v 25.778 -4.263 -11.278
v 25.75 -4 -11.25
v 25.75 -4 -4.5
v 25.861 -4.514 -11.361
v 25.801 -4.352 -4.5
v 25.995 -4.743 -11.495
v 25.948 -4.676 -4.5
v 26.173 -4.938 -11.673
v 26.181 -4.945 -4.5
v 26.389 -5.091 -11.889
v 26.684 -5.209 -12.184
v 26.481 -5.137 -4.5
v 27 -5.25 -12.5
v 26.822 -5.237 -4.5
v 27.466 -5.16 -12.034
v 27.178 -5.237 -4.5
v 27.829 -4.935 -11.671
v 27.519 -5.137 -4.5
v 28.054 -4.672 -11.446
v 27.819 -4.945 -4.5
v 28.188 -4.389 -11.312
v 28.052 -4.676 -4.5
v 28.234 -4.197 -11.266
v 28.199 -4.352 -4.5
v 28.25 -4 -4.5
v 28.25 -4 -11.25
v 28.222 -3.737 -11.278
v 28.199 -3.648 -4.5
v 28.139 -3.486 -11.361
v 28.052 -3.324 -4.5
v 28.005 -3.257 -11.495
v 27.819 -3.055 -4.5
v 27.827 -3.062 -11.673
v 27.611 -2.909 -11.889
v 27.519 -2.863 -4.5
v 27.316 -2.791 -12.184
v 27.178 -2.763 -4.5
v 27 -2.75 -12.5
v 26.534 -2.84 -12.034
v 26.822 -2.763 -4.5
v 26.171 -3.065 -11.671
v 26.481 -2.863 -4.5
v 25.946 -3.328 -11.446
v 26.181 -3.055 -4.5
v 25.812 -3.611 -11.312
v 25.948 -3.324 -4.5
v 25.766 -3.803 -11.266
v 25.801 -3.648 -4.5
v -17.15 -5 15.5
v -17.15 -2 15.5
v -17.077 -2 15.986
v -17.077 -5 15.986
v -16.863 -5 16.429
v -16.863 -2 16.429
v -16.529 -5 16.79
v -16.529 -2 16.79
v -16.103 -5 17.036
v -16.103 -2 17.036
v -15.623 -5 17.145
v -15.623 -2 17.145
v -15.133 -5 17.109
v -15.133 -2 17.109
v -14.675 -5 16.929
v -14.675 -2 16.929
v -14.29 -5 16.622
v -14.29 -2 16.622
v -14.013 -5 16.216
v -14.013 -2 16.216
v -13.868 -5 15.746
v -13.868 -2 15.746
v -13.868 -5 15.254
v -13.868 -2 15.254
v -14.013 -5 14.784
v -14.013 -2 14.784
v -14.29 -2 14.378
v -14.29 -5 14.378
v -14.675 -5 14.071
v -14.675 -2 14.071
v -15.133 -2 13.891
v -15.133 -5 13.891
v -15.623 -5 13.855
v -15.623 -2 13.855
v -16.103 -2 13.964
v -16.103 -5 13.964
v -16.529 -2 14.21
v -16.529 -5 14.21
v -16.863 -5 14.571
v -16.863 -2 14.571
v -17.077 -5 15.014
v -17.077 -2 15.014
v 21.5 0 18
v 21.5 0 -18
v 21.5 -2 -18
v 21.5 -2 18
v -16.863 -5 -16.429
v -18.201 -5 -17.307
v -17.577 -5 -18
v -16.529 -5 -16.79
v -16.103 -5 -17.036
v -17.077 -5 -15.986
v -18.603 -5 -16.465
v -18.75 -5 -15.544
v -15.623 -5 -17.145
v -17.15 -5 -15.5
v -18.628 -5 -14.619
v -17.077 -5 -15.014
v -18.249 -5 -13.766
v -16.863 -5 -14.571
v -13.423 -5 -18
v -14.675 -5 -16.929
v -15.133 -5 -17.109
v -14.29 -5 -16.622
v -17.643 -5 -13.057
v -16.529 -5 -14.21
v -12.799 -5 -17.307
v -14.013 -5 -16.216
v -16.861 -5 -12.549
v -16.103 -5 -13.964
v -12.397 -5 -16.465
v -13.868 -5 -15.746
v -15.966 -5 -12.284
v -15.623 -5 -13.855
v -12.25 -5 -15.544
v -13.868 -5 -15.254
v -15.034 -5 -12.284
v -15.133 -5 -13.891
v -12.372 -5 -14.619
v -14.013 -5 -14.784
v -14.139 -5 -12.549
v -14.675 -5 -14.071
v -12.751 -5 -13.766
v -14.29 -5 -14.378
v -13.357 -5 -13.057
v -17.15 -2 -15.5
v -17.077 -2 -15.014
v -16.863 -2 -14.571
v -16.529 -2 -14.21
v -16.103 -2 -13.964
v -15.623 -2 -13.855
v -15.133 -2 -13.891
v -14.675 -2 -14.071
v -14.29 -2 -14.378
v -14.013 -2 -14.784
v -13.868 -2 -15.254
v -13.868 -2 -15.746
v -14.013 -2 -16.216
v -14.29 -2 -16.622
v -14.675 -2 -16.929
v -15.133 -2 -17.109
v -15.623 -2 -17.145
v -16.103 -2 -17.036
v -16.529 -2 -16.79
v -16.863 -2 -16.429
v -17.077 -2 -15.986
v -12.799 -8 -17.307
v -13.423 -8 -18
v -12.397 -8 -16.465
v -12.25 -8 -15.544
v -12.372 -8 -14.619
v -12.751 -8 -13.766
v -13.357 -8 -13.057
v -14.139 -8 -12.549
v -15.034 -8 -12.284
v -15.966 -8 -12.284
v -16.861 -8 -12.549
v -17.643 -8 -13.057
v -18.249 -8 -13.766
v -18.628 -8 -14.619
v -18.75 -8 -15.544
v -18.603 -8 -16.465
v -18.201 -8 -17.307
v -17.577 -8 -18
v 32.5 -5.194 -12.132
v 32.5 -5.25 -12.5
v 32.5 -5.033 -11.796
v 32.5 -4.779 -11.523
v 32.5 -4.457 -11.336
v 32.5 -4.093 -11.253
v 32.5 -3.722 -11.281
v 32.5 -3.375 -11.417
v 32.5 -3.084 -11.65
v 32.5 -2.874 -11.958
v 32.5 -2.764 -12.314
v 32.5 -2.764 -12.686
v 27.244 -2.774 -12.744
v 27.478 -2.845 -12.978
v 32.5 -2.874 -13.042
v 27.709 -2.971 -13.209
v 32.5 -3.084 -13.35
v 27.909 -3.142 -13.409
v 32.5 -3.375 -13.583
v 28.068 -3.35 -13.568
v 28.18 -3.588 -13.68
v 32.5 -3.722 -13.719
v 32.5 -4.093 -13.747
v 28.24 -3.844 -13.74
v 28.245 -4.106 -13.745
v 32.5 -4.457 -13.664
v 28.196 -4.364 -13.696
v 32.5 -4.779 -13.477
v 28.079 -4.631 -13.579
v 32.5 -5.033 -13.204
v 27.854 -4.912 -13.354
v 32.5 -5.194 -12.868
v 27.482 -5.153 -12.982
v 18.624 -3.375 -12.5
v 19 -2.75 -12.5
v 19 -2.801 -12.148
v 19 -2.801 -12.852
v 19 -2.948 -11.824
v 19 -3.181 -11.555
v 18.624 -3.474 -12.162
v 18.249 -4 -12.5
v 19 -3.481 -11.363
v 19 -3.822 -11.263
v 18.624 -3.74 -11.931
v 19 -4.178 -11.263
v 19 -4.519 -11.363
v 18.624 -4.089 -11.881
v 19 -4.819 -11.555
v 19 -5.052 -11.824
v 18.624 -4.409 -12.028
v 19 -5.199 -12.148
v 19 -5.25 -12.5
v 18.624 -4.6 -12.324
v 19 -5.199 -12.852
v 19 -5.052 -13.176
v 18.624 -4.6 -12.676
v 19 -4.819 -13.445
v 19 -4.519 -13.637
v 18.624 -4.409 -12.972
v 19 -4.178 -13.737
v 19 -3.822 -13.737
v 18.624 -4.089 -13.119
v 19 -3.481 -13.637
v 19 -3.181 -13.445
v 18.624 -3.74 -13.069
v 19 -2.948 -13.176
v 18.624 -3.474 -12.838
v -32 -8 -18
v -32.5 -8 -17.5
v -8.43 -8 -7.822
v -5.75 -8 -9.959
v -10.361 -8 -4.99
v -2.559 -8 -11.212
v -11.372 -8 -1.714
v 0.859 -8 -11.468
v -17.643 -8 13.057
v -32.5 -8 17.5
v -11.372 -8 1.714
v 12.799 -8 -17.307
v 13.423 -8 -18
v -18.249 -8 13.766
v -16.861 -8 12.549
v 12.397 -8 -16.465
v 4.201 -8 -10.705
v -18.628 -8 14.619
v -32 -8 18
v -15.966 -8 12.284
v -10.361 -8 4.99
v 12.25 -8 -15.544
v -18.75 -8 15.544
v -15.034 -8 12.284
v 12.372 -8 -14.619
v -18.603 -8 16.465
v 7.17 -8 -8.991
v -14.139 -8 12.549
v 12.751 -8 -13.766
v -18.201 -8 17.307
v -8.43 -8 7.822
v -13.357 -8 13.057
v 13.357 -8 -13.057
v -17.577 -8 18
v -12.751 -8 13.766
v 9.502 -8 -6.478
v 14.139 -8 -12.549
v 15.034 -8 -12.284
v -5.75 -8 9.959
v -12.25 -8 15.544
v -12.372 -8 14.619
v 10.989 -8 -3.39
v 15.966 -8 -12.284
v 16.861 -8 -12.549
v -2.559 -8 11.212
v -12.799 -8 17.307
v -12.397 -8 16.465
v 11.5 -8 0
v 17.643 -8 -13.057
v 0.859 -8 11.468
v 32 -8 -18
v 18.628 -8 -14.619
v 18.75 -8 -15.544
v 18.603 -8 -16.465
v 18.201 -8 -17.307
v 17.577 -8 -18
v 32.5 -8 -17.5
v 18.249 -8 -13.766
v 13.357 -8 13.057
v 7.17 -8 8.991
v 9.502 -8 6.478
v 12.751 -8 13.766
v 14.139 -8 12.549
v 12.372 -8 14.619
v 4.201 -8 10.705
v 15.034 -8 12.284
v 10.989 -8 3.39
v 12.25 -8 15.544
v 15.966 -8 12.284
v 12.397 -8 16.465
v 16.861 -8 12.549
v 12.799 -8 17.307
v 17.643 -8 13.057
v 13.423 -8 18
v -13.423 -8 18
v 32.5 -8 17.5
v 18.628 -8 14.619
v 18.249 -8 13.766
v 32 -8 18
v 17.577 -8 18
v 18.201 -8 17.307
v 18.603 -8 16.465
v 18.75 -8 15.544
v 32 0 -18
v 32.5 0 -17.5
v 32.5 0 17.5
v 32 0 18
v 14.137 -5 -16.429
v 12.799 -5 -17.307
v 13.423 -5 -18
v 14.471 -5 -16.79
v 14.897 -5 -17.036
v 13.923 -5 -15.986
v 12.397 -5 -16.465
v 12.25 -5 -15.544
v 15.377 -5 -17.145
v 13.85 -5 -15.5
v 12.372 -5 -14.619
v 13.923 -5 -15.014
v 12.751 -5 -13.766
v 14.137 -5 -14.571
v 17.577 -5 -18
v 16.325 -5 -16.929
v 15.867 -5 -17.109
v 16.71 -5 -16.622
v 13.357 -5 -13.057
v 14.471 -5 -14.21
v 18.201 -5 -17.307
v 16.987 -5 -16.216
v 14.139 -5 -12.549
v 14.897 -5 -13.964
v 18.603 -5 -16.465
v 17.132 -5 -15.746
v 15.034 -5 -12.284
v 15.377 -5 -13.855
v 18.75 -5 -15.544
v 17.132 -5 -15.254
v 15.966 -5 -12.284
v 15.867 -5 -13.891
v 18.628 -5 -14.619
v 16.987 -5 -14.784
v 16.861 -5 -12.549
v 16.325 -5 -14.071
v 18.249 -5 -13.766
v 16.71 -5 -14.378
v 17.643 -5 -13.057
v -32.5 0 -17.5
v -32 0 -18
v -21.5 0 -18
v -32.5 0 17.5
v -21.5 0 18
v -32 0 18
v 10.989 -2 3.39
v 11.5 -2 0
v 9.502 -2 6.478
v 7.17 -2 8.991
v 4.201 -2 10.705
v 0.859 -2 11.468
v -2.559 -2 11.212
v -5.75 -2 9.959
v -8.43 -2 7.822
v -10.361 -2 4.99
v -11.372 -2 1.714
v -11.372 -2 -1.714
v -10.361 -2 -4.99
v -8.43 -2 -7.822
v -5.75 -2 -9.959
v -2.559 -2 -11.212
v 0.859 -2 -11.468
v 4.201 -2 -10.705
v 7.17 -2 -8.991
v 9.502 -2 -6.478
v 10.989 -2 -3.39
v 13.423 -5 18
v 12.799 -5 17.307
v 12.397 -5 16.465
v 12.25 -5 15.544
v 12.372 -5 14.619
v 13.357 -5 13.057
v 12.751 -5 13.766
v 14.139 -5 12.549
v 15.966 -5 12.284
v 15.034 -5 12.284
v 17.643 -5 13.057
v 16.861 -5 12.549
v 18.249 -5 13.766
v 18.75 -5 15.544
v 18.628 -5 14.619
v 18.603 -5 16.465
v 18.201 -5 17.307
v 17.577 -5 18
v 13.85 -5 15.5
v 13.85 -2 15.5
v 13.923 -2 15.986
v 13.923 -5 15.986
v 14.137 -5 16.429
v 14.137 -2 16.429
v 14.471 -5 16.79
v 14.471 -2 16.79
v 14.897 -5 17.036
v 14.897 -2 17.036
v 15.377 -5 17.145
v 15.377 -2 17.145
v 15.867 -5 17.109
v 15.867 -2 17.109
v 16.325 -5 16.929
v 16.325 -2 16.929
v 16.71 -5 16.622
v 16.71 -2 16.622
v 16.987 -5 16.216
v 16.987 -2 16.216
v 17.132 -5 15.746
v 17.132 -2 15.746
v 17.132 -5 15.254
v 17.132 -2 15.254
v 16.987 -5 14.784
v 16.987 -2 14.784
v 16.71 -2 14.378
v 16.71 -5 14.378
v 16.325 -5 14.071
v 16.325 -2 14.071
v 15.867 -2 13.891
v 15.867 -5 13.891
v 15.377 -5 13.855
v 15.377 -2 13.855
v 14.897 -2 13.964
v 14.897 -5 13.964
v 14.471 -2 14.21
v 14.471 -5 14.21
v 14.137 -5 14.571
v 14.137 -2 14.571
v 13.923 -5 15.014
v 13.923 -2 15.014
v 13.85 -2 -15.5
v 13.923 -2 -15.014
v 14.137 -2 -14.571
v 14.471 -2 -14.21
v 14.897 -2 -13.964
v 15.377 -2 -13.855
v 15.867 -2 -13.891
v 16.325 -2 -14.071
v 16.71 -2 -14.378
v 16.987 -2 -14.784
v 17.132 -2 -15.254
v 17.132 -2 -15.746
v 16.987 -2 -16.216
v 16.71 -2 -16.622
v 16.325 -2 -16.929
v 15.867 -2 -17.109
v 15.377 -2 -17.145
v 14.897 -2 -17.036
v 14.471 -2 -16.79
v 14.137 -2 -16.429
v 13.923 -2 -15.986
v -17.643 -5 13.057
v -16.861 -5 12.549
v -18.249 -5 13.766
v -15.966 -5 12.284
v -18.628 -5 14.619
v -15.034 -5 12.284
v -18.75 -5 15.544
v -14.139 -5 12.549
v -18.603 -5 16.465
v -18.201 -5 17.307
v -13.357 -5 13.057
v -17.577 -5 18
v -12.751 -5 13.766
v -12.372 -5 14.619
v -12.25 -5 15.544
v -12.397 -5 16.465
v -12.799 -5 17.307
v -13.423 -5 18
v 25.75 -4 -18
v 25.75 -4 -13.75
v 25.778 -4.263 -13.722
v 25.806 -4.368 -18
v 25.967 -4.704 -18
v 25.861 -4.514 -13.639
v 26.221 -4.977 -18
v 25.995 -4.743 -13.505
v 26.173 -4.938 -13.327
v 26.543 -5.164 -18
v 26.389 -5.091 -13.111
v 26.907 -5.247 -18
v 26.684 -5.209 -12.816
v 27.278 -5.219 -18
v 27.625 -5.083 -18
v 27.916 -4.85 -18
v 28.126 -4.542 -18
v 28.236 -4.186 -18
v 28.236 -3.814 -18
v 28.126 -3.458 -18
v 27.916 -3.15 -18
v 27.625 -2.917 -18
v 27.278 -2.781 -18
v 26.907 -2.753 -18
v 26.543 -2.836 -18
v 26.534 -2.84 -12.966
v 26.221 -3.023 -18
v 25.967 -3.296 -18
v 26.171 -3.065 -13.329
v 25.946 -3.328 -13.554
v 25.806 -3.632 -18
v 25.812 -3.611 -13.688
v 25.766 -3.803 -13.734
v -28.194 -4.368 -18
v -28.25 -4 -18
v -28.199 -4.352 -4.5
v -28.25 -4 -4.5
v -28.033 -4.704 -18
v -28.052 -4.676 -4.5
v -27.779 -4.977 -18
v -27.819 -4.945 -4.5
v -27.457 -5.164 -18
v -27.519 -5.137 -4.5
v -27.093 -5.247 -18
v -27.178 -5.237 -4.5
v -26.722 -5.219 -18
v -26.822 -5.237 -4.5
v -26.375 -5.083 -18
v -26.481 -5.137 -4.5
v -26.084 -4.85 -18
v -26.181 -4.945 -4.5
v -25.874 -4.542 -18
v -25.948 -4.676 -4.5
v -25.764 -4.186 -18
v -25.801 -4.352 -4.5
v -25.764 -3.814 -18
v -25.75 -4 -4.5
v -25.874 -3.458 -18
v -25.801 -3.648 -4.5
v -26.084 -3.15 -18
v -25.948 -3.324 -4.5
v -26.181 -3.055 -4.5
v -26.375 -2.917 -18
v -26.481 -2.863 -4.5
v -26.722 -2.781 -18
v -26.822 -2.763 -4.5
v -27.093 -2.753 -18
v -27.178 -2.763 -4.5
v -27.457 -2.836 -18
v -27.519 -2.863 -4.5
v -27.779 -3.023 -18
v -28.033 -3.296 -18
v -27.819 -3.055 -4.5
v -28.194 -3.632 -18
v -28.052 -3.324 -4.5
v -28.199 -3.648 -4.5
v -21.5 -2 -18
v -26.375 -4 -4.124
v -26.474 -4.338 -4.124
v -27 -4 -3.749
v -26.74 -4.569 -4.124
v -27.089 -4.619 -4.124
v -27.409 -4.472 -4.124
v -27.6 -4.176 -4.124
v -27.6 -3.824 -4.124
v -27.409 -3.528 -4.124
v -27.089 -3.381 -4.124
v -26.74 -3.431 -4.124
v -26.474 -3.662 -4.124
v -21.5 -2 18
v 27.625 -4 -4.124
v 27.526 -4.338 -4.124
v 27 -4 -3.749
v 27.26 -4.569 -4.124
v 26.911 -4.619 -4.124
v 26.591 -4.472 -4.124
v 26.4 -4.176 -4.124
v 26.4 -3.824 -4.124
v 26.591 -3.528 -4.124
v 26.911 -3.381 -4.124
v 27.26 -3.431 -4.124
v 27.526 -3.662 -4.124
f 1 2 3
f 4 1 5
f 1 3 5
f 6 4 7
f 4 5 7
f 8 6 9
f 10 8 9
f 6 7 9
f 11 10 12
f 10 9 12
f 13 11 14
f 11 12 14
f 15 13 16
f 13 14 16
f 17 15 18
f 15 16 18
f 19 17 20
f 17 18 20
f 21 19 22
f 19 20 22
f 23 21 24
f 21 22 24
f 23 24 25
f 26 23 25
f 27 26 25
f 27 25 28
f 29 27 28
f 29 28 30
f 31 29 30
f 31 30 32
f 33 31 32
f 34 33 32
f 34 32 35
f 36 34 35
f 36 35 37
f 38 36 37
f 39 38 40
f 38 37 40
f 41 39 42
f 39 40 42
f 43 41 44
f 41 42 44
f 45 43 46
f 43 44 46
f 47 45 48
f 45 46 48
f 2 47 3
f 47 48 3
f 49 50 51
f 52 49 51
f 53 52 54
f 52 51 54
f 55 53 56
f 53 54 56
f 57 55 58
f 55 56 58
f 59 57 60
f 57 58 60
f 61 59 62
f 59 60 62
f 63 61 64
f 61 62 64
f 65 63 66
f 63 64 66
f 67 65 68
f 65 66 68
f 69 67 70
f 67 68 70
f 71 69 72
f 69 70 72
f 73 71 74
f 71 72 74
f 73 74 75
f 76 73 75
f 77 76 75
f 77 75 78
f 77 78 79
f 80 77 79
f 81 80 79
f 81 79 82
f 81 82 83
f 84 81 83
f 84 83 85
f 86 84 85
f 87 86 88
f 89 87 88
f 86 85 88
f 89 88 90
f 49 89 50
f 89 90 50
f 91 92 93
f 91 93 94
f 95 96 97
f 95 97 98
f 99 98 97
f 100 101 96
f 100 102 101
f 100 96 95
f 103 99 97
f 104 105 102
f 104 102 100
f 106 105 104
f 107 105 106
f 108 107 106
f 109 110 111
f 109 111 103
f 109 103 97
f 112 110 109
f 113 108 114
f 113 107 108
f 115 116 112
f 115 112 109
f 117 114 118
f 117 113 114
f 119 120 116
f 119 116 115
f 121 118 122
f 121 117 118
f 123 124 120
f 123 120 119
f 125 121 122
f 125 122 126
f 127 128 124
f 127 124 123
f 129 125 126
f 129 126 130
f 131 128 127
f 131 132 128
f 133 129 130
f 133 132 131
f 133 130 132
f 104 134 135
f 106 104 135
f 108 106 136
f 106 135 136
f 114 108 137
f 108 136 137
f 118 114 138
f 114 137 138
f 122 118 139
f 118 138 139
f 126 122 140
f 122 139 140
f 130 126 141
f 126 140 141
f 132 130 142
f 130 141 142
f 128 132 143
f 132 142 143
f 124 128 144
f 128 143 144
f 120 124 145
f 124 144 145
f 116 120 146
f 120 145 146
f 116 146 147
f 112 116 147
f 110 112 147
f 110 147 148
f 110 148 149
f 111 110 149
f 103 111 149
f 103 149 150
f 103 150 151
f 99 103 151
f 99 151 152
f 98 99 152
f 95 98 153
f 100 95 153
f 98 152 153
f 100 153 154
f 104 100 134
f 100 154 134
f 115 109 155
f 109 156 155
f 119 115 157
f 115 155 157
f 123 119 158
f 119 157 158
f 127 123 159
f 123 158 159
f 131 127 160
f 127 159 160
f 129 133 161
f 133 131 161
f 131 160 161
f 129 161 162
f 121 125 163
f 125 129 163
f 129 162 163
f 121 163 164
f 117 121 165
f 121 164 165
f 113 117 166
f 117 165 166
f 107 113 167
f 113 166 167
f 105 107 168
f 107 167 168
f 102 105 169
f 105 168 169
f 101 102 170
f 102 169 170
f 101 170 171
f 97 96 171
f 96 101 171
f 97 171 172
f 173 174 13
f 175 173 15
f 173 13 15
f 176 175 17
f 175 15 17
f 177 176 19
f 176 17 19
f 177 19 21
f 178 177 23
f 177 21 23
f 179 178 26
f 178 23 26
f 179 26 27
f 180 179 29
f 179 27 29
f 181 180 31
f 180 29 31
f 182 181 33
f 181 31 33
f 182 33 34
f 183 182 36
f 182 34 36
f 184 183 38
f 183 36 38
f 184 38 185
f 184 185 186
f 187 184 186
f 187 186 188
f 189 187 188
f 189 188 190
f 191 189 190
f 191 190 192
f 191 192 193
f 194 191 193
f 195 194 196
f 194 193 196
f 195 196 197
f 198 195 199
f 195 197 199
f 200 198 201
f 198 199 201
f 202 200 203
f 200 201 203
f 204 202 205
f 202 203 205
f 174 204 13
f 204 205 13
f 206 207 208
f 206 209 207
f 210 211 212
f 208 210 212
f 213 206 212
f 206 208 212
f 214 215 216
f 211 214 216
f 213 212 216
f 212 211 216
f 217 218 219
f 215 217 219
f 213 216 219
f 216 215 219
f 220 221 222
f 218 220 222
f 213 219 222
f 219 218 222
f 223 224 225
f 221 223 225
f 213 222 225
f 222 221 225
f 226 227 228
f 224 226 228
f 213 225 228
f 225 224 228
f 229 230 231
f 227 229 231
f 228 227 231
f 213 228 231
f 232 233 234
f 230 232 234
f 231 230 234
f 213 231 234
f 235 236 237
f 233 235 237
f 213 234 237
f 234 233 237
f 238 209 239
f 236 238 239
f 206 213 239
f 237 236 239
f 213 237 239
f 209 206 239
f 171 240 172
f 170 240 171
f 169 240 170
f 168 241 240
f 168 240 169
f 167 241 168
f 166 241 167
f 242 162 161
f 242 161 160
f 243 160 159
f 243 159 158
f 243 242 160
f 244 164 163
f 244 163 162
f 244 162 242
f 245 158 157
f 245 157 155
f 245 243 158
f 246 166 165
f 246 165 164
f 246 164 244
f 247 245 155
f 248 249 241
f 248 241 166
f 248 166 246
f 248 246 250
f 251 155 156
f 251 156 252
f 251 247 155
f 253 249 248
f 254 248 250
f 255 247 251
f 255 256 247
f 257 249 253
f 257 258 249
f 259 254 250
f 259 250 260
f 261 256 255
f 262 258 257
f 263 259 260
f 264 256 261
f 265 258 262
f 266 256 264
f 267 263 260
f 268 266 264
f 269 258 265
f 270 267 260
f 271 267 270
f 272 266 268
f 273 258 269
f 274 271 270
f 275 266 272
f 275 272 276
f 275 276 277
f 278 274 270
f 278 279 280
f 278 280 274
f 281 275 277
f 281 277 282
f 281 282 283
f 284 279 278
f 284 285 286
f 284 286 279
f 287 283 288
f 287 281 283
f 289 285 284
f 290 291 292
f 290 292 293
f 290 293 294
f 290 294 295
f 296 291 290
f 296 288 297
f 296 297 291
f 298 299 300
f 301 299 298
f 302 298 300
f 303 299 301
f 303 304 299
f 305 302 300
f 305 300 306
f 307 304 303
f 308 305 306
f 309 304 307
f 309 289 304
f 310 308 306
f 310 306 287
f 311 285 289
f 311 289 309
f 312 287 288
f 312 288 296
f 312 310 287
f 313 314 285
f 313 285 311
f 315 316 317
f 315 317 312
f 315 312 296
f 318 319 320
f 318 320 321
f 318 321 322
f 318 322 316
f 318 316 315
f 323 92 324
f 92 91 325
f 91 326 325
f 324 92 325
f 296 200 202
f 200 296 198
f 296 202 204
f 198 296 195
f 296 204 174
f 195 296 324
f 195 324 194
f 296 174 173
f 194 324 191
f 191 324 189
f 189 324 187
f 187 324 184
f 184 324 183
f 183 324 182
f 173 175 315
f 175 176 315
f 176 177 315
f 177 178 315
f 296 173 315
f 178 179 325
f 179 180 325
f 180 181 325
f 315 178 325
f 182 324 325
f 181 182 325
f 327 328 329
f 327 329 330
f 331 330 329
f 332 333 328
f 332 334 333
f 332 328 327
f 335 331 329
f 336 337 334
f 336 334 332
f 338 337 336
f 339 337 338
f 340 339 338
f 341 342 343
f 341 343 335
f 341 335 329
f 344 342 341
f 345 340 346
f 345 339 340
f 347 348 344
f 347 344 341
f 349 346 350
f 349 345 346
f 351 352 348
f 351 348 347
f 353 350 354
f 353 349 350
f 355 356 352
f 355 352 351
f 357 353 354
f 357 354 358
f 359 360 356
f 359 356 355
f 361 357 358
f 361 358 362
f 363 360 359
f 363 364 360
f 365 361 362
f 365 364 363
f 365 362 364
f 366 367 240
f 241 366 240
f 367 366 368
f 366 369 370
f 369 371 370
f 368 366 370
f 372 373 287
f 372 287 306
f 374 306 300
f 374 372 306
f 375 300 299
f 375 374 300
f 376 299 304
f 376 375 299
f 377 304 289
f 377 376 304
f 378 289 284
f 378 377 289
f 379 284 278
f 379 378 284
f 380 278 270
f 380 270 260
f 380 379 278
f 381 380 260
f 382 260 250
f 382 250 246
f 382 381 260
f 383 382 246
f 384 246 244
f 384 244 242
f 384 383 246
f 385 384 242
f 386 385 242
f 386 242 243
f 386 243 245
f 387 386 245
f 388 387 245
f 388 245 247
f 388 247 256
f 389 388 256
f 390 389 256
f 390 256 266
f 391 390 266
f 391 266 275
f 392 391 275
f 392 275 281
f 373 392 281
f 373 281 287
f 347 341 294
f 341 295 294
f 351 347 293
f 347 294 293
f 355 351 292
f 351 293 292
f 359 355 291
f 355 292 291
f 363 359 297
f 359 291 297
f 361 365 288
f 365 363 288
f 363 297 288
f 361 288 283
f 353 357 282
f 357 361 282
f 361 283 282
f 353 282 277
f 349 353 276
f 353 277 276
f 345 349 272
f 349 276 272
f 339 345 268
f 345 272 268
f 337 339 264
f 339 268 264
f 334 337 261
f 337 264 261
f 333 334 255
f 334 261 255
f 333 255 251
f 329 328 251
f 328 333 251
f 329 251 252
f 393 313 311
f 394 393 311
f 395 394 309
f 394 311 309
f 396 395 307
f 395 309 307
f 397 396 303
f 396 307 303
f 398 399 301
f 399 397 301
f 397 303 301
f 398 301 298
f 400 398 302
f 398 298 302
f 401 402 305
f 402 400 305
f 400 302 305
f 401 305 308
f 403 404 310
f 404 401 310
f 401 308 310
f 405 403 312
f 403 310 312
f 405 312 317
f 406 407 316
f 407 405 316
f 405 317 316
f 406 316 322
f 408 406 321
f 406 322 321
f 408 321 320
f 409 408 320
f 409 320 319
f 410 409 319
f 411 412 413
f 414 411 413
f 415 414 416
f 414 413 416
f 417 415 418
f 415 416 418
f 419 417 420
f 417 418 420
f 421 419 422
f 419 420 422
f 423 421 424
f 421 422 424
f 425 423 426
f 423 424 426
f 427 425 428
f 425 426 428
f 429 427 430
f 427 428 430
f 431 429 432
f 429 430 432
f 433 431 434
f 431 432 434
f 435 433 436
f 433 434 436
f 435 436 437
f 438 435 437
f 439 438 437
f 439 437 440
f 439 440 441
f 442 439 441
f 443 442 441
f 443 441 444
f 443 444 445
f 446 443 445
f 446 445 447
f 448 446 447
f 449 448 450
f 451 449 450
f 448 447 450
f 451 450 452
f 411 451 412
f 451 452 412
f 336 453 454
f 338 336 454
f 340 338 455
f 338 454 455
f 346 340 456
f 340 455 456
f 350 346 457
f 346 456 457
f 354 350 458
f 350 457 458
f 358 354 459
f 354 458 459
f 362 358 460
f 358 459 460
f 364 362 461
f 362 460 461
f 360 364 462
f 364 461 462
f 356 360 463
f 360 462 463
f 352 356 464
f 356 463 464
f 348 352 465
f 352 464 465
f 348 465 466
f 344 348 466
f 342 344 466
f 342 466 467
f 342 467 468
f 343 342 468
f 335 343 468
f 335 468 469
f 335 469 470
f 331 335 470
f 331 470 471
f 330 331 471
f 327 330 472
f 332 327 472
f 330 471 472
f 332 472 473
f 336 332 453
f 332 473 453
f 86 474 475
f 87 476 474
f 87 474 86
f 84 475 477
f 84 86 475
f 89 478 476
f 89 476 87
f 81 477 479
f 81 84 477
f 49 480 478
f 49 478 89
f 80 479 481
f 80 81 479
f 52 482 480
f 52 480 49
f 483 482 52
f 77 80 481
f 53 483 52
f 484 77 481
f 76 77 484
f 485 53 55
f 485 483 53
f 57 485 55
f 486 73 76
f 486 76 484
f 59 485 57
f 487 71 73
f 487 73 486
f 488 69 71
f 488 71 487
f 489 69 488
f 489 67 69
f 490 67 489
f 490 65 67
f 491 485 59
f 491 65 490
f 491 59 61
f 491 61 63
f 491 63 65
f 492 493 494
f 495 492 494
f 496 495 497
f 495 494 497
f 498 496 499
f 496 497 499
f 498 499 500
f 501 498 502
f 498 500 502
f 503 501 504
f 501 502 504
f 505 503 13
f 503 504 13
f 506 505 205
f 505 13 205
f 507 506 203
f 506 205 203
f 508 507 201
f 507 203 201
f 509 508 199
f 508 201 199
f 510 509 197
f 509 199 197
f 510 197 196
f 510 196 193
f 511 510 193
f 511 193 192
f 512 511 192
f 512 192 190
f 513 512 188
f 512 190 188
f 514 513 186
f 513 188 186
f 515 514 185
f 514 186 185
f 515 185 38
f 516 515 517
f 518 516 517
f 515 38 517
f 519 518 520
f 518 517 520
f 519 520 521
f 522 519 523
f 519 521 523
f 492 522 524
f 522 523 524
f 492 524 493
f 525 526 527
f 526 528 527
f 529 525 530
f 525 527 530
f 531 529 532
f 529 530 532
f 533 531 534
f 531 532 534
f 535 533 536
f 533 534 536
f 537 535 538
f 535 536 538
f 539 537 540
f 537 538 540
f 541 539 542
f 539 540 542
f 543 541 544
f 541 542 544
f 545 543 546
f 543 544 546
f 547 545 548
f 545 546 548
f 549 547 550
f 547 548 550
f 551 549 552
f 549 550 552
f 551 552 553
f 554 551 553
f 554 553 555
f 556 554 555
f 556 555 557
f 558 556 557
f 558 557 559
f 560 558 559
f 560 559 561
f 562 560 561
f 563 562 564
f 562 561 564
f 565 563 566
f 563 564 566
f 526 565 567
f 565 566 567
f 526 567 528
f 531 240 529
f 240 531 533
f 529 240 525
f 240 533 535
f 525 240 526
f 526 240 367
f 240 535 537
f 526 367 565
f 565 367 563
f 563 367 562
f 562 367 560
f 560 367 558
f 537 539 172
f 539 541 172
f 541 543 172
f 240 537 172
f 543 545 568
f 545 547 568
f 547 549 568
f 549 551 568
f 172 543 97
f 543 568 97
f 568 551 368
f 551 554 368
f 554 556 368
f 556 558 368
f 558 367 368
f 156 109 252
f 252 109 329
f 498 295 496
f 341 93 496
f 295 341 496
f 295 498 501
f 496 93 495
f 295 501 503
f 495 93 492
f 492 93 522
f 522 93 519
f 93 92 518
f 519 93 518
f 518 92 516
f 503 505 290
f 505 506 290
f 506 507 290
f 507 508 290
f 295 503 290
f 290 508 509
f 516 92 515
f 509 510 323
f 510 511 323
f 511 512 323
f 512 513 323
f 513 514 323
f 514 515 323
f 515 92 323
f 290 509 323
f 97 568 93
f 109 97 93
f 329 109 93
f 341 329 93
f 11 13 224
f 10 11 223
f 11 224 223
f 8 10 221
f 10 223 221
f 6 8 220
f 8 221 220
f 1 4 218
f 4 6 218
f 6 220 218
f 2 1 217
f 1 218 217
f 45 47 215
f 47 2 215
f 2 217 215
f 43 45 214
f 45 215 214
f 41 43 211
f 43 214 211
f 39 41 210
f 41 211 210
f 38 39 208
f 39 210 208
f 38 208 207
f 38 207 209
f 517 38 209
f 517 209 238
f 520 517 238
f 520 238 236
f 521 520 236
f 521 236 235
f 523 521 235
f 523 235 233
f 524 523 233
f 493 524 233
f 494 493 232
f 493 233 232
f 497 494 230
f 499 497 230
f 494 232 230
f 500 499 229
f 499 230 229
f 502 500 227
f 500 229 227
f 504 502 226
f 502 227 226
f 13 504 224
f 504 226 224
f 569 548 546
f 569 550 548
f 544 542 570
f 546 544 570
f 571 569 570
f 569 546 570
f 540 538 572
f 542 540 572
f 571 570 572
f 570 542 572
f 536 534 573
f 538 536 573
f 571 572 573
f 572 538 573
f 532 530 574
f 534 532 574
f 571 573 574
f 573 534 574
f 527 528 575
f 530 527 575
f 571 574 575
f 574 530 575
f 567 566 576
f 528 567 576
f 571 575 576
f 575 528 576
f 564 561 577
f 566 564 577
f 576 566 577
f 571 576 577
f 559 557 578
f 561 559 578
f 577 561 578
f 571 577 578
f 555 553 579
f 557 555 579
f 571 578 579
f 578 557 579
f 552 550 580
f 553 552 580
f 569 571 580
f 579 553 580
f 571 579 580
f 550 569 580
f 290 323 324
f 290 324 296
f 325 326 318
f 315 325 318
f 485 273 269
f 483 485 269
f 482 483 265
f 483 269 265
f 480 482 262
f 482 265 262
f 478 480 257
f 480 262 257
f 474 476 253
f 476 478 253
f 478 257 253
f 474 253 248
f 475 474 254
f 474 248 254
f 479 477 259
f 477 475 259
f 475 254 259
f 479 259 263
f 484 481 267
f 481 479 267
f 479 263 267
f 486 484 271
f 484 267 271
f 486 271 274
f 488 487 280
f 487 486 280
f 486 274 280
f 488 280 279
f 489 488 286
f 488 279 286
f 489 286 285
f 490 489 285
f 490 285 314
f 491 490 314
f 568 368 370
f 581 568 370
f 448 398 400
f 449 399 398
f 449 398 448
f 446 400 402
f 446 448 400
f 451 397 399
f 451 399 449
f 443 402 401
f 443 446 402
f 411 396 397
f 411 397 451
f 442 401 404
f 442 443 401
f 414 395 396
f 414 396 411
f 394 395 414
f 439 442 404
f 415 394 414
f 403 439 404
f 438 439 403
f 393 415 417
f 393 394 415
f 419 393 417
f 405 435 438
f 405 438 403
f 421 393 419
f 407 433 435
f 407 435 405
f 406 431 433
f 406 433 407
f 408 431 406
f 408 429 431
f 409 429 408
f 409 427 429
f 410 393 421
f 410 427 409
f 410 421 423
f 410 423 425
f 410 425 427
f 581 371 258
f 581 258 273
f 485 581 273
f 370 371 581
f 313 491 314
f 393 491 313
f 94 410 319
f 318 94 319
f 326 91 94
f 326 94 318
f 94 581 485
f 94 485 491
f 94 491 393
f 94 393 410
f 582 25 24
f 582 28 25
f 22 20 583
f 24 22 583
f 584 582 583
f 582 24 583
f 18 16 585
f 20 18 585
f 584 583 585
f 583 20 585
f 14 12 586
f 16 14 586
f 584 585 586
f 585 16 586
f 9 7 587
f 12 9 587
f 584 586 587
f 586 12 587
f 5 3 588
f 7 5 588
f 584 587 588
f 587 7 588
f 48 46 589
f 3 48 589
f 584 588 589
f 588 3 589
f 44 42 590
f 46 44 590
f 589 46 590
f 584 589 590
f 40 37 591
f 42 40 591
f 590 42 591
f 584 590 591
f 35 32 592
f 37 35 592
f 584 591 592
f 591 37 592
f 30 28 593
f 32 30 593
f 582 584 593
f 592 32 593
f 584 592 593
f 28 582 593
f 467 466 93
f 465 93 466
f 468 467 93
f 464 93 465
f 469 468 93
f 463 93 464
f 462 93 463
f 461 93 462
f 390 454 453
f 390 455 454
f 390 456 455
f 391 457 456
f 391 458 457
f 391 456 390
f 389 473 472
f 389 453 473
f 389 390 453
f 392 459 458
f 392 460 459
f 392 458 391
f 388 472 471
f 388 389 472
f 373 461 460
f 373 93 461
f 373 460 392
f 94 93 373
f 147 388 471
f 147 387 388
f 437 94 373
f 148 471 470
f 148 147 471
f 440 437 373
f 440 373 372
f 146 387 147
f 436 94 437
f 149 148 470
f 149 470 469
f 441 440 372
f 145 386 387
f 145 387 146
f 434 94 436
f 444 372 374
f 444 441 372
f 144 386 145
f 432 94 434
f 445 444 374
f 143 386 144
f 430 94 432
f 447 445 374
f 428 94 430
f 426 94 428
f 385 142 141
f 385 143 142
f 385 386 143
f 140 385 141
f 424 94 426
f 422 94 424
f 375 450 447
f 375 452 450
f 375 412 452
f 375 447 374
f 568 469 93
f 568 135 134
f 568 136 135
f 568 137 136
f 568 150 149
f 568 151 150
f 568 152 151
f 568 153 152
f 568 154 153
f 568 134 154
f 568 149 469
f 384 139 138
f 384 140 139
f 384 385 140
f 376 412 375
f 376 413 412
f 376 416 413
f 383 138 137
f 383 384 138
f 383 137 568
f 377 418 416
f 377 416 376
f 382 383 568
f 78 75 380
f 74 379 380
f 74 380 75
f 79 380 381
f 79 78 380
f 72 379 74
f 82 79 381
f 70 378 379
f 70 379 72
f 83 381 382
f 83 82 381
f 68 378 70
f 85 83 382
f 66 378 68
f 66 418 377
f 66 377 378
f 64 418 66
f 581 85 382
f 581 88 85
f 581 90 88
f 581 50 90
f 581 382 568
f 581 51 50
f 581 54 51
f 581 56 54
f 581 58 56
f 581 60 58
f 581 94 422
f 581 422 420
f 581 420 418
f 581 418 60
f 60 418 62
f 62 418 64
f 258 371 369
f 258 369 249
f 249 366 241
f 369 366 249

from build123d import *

# Parameters (mm, degrees)
F0_W           = 65
F0_H           = 36
F0_R           = 11.5
F1_DEPTH       = 8
F3_D           = 3.3
F3_CBORE_D     = 6.5
F3_CBORE_DEPTH = 3
F4_SIZE        = 0.5
F6_D           = 2.5
F6_DEPTH       = 13.5
F6_TIP         = 0.7510757738
F7_W           = 43
F7_H           = 36
F7_R           = 1.65
F7_R_2         = 11.5
F8_DEPTH       = 2
F10_D          = 2.5
F10_DEPTH      = 13.5
F10_TIP        = 0.7510757738


with BuildPart() as f1:
    # F0 (on Front) → F1 (new body)
    with BuildSketch(Plane.XZ):
        Rectangle(F0_W, F0_H)
        Circle(F0_R, mode=Mode.SUBTRACT)
    extrude(amount=F1_DEPTH)

    # F3 (through all)
    with Locations(Plane.XZ.offset(8)):
        with Locations((15.5, 15.5), (15.5, -15.5), (-15.5, -15.5), (-15.5, 15.5)):
            CounterBoreHole(F3_D / 2, F3_CBORE_D / 2, F3_CBORE_DEPTH)

    # F4
    f4_edges = [f1.edges().sort_by_distance(p)[0] for p in [
        (-32.5, -4, 18),
        (32.5, -4, 18),
        (32.5, -4, -18),
        (-32.5, -4, -18),
    ]]
    chamfer(f4_edges, length=F4_SIZE)

    # F6
    with Locations(Plane(origin=(0, 0, -18), x_dir=(1, 0, 0), z_dir=(0, 0, -1))):
        with Locations((27, 4), (-27, 4)):
            Hole(F6_D / 2, depth=F6_DEPTH)
            with Locations((0, 0, -(F6_DEPTH + F6_TIP / 2))):  # 118° drill point
                Cone(0, F6_D / 2, F6_TIP, mode=Mode.SUBTRACT)

    # F7 (on face) → F8 (cut)
    with BuildSketch(Plane(origin=(0, 0, 0), x_dir=(-1, 0, 0), z_dir=(0, 1, 0))):
        Rectangle(F7_W, F7_H)
        with Locations((-15.5, -15.5)):
            Circle(F7_R, mode=Mode.SUBTRACT)
        with Locations((15.5, -15.5)):
            Circle(F7_R, mode=Mode.SUBTRACT)
        with Locations((-15.5, 15.5)):
            Circle(F7_R, mode=Mode.SUBTRACT)
        Circle(F7_R_2, mode=Mode.SUBTRACT)
        with Locations((15.5, 15.5)):
            Circle(F7_R, mode=Mode.SUBTRACT)
    extrude(amount=-F8_DEPTH, mode=Mode.SUBTRACT)

    # F10
    with Locations(Plane.YZ.offset(32.5)):
        with Locations((-4, -12.5)):
            Hole(F10_D / 2, depth=F10_DEPTH)
            with Locations((0, 0, -(F10_DEPTH + F10_TIP / 2))):  # 118° drill point
                Cone(0, F10_D / 2, F10_TIP, mode=Mode.SUBTRACT)


solid = f1.part
